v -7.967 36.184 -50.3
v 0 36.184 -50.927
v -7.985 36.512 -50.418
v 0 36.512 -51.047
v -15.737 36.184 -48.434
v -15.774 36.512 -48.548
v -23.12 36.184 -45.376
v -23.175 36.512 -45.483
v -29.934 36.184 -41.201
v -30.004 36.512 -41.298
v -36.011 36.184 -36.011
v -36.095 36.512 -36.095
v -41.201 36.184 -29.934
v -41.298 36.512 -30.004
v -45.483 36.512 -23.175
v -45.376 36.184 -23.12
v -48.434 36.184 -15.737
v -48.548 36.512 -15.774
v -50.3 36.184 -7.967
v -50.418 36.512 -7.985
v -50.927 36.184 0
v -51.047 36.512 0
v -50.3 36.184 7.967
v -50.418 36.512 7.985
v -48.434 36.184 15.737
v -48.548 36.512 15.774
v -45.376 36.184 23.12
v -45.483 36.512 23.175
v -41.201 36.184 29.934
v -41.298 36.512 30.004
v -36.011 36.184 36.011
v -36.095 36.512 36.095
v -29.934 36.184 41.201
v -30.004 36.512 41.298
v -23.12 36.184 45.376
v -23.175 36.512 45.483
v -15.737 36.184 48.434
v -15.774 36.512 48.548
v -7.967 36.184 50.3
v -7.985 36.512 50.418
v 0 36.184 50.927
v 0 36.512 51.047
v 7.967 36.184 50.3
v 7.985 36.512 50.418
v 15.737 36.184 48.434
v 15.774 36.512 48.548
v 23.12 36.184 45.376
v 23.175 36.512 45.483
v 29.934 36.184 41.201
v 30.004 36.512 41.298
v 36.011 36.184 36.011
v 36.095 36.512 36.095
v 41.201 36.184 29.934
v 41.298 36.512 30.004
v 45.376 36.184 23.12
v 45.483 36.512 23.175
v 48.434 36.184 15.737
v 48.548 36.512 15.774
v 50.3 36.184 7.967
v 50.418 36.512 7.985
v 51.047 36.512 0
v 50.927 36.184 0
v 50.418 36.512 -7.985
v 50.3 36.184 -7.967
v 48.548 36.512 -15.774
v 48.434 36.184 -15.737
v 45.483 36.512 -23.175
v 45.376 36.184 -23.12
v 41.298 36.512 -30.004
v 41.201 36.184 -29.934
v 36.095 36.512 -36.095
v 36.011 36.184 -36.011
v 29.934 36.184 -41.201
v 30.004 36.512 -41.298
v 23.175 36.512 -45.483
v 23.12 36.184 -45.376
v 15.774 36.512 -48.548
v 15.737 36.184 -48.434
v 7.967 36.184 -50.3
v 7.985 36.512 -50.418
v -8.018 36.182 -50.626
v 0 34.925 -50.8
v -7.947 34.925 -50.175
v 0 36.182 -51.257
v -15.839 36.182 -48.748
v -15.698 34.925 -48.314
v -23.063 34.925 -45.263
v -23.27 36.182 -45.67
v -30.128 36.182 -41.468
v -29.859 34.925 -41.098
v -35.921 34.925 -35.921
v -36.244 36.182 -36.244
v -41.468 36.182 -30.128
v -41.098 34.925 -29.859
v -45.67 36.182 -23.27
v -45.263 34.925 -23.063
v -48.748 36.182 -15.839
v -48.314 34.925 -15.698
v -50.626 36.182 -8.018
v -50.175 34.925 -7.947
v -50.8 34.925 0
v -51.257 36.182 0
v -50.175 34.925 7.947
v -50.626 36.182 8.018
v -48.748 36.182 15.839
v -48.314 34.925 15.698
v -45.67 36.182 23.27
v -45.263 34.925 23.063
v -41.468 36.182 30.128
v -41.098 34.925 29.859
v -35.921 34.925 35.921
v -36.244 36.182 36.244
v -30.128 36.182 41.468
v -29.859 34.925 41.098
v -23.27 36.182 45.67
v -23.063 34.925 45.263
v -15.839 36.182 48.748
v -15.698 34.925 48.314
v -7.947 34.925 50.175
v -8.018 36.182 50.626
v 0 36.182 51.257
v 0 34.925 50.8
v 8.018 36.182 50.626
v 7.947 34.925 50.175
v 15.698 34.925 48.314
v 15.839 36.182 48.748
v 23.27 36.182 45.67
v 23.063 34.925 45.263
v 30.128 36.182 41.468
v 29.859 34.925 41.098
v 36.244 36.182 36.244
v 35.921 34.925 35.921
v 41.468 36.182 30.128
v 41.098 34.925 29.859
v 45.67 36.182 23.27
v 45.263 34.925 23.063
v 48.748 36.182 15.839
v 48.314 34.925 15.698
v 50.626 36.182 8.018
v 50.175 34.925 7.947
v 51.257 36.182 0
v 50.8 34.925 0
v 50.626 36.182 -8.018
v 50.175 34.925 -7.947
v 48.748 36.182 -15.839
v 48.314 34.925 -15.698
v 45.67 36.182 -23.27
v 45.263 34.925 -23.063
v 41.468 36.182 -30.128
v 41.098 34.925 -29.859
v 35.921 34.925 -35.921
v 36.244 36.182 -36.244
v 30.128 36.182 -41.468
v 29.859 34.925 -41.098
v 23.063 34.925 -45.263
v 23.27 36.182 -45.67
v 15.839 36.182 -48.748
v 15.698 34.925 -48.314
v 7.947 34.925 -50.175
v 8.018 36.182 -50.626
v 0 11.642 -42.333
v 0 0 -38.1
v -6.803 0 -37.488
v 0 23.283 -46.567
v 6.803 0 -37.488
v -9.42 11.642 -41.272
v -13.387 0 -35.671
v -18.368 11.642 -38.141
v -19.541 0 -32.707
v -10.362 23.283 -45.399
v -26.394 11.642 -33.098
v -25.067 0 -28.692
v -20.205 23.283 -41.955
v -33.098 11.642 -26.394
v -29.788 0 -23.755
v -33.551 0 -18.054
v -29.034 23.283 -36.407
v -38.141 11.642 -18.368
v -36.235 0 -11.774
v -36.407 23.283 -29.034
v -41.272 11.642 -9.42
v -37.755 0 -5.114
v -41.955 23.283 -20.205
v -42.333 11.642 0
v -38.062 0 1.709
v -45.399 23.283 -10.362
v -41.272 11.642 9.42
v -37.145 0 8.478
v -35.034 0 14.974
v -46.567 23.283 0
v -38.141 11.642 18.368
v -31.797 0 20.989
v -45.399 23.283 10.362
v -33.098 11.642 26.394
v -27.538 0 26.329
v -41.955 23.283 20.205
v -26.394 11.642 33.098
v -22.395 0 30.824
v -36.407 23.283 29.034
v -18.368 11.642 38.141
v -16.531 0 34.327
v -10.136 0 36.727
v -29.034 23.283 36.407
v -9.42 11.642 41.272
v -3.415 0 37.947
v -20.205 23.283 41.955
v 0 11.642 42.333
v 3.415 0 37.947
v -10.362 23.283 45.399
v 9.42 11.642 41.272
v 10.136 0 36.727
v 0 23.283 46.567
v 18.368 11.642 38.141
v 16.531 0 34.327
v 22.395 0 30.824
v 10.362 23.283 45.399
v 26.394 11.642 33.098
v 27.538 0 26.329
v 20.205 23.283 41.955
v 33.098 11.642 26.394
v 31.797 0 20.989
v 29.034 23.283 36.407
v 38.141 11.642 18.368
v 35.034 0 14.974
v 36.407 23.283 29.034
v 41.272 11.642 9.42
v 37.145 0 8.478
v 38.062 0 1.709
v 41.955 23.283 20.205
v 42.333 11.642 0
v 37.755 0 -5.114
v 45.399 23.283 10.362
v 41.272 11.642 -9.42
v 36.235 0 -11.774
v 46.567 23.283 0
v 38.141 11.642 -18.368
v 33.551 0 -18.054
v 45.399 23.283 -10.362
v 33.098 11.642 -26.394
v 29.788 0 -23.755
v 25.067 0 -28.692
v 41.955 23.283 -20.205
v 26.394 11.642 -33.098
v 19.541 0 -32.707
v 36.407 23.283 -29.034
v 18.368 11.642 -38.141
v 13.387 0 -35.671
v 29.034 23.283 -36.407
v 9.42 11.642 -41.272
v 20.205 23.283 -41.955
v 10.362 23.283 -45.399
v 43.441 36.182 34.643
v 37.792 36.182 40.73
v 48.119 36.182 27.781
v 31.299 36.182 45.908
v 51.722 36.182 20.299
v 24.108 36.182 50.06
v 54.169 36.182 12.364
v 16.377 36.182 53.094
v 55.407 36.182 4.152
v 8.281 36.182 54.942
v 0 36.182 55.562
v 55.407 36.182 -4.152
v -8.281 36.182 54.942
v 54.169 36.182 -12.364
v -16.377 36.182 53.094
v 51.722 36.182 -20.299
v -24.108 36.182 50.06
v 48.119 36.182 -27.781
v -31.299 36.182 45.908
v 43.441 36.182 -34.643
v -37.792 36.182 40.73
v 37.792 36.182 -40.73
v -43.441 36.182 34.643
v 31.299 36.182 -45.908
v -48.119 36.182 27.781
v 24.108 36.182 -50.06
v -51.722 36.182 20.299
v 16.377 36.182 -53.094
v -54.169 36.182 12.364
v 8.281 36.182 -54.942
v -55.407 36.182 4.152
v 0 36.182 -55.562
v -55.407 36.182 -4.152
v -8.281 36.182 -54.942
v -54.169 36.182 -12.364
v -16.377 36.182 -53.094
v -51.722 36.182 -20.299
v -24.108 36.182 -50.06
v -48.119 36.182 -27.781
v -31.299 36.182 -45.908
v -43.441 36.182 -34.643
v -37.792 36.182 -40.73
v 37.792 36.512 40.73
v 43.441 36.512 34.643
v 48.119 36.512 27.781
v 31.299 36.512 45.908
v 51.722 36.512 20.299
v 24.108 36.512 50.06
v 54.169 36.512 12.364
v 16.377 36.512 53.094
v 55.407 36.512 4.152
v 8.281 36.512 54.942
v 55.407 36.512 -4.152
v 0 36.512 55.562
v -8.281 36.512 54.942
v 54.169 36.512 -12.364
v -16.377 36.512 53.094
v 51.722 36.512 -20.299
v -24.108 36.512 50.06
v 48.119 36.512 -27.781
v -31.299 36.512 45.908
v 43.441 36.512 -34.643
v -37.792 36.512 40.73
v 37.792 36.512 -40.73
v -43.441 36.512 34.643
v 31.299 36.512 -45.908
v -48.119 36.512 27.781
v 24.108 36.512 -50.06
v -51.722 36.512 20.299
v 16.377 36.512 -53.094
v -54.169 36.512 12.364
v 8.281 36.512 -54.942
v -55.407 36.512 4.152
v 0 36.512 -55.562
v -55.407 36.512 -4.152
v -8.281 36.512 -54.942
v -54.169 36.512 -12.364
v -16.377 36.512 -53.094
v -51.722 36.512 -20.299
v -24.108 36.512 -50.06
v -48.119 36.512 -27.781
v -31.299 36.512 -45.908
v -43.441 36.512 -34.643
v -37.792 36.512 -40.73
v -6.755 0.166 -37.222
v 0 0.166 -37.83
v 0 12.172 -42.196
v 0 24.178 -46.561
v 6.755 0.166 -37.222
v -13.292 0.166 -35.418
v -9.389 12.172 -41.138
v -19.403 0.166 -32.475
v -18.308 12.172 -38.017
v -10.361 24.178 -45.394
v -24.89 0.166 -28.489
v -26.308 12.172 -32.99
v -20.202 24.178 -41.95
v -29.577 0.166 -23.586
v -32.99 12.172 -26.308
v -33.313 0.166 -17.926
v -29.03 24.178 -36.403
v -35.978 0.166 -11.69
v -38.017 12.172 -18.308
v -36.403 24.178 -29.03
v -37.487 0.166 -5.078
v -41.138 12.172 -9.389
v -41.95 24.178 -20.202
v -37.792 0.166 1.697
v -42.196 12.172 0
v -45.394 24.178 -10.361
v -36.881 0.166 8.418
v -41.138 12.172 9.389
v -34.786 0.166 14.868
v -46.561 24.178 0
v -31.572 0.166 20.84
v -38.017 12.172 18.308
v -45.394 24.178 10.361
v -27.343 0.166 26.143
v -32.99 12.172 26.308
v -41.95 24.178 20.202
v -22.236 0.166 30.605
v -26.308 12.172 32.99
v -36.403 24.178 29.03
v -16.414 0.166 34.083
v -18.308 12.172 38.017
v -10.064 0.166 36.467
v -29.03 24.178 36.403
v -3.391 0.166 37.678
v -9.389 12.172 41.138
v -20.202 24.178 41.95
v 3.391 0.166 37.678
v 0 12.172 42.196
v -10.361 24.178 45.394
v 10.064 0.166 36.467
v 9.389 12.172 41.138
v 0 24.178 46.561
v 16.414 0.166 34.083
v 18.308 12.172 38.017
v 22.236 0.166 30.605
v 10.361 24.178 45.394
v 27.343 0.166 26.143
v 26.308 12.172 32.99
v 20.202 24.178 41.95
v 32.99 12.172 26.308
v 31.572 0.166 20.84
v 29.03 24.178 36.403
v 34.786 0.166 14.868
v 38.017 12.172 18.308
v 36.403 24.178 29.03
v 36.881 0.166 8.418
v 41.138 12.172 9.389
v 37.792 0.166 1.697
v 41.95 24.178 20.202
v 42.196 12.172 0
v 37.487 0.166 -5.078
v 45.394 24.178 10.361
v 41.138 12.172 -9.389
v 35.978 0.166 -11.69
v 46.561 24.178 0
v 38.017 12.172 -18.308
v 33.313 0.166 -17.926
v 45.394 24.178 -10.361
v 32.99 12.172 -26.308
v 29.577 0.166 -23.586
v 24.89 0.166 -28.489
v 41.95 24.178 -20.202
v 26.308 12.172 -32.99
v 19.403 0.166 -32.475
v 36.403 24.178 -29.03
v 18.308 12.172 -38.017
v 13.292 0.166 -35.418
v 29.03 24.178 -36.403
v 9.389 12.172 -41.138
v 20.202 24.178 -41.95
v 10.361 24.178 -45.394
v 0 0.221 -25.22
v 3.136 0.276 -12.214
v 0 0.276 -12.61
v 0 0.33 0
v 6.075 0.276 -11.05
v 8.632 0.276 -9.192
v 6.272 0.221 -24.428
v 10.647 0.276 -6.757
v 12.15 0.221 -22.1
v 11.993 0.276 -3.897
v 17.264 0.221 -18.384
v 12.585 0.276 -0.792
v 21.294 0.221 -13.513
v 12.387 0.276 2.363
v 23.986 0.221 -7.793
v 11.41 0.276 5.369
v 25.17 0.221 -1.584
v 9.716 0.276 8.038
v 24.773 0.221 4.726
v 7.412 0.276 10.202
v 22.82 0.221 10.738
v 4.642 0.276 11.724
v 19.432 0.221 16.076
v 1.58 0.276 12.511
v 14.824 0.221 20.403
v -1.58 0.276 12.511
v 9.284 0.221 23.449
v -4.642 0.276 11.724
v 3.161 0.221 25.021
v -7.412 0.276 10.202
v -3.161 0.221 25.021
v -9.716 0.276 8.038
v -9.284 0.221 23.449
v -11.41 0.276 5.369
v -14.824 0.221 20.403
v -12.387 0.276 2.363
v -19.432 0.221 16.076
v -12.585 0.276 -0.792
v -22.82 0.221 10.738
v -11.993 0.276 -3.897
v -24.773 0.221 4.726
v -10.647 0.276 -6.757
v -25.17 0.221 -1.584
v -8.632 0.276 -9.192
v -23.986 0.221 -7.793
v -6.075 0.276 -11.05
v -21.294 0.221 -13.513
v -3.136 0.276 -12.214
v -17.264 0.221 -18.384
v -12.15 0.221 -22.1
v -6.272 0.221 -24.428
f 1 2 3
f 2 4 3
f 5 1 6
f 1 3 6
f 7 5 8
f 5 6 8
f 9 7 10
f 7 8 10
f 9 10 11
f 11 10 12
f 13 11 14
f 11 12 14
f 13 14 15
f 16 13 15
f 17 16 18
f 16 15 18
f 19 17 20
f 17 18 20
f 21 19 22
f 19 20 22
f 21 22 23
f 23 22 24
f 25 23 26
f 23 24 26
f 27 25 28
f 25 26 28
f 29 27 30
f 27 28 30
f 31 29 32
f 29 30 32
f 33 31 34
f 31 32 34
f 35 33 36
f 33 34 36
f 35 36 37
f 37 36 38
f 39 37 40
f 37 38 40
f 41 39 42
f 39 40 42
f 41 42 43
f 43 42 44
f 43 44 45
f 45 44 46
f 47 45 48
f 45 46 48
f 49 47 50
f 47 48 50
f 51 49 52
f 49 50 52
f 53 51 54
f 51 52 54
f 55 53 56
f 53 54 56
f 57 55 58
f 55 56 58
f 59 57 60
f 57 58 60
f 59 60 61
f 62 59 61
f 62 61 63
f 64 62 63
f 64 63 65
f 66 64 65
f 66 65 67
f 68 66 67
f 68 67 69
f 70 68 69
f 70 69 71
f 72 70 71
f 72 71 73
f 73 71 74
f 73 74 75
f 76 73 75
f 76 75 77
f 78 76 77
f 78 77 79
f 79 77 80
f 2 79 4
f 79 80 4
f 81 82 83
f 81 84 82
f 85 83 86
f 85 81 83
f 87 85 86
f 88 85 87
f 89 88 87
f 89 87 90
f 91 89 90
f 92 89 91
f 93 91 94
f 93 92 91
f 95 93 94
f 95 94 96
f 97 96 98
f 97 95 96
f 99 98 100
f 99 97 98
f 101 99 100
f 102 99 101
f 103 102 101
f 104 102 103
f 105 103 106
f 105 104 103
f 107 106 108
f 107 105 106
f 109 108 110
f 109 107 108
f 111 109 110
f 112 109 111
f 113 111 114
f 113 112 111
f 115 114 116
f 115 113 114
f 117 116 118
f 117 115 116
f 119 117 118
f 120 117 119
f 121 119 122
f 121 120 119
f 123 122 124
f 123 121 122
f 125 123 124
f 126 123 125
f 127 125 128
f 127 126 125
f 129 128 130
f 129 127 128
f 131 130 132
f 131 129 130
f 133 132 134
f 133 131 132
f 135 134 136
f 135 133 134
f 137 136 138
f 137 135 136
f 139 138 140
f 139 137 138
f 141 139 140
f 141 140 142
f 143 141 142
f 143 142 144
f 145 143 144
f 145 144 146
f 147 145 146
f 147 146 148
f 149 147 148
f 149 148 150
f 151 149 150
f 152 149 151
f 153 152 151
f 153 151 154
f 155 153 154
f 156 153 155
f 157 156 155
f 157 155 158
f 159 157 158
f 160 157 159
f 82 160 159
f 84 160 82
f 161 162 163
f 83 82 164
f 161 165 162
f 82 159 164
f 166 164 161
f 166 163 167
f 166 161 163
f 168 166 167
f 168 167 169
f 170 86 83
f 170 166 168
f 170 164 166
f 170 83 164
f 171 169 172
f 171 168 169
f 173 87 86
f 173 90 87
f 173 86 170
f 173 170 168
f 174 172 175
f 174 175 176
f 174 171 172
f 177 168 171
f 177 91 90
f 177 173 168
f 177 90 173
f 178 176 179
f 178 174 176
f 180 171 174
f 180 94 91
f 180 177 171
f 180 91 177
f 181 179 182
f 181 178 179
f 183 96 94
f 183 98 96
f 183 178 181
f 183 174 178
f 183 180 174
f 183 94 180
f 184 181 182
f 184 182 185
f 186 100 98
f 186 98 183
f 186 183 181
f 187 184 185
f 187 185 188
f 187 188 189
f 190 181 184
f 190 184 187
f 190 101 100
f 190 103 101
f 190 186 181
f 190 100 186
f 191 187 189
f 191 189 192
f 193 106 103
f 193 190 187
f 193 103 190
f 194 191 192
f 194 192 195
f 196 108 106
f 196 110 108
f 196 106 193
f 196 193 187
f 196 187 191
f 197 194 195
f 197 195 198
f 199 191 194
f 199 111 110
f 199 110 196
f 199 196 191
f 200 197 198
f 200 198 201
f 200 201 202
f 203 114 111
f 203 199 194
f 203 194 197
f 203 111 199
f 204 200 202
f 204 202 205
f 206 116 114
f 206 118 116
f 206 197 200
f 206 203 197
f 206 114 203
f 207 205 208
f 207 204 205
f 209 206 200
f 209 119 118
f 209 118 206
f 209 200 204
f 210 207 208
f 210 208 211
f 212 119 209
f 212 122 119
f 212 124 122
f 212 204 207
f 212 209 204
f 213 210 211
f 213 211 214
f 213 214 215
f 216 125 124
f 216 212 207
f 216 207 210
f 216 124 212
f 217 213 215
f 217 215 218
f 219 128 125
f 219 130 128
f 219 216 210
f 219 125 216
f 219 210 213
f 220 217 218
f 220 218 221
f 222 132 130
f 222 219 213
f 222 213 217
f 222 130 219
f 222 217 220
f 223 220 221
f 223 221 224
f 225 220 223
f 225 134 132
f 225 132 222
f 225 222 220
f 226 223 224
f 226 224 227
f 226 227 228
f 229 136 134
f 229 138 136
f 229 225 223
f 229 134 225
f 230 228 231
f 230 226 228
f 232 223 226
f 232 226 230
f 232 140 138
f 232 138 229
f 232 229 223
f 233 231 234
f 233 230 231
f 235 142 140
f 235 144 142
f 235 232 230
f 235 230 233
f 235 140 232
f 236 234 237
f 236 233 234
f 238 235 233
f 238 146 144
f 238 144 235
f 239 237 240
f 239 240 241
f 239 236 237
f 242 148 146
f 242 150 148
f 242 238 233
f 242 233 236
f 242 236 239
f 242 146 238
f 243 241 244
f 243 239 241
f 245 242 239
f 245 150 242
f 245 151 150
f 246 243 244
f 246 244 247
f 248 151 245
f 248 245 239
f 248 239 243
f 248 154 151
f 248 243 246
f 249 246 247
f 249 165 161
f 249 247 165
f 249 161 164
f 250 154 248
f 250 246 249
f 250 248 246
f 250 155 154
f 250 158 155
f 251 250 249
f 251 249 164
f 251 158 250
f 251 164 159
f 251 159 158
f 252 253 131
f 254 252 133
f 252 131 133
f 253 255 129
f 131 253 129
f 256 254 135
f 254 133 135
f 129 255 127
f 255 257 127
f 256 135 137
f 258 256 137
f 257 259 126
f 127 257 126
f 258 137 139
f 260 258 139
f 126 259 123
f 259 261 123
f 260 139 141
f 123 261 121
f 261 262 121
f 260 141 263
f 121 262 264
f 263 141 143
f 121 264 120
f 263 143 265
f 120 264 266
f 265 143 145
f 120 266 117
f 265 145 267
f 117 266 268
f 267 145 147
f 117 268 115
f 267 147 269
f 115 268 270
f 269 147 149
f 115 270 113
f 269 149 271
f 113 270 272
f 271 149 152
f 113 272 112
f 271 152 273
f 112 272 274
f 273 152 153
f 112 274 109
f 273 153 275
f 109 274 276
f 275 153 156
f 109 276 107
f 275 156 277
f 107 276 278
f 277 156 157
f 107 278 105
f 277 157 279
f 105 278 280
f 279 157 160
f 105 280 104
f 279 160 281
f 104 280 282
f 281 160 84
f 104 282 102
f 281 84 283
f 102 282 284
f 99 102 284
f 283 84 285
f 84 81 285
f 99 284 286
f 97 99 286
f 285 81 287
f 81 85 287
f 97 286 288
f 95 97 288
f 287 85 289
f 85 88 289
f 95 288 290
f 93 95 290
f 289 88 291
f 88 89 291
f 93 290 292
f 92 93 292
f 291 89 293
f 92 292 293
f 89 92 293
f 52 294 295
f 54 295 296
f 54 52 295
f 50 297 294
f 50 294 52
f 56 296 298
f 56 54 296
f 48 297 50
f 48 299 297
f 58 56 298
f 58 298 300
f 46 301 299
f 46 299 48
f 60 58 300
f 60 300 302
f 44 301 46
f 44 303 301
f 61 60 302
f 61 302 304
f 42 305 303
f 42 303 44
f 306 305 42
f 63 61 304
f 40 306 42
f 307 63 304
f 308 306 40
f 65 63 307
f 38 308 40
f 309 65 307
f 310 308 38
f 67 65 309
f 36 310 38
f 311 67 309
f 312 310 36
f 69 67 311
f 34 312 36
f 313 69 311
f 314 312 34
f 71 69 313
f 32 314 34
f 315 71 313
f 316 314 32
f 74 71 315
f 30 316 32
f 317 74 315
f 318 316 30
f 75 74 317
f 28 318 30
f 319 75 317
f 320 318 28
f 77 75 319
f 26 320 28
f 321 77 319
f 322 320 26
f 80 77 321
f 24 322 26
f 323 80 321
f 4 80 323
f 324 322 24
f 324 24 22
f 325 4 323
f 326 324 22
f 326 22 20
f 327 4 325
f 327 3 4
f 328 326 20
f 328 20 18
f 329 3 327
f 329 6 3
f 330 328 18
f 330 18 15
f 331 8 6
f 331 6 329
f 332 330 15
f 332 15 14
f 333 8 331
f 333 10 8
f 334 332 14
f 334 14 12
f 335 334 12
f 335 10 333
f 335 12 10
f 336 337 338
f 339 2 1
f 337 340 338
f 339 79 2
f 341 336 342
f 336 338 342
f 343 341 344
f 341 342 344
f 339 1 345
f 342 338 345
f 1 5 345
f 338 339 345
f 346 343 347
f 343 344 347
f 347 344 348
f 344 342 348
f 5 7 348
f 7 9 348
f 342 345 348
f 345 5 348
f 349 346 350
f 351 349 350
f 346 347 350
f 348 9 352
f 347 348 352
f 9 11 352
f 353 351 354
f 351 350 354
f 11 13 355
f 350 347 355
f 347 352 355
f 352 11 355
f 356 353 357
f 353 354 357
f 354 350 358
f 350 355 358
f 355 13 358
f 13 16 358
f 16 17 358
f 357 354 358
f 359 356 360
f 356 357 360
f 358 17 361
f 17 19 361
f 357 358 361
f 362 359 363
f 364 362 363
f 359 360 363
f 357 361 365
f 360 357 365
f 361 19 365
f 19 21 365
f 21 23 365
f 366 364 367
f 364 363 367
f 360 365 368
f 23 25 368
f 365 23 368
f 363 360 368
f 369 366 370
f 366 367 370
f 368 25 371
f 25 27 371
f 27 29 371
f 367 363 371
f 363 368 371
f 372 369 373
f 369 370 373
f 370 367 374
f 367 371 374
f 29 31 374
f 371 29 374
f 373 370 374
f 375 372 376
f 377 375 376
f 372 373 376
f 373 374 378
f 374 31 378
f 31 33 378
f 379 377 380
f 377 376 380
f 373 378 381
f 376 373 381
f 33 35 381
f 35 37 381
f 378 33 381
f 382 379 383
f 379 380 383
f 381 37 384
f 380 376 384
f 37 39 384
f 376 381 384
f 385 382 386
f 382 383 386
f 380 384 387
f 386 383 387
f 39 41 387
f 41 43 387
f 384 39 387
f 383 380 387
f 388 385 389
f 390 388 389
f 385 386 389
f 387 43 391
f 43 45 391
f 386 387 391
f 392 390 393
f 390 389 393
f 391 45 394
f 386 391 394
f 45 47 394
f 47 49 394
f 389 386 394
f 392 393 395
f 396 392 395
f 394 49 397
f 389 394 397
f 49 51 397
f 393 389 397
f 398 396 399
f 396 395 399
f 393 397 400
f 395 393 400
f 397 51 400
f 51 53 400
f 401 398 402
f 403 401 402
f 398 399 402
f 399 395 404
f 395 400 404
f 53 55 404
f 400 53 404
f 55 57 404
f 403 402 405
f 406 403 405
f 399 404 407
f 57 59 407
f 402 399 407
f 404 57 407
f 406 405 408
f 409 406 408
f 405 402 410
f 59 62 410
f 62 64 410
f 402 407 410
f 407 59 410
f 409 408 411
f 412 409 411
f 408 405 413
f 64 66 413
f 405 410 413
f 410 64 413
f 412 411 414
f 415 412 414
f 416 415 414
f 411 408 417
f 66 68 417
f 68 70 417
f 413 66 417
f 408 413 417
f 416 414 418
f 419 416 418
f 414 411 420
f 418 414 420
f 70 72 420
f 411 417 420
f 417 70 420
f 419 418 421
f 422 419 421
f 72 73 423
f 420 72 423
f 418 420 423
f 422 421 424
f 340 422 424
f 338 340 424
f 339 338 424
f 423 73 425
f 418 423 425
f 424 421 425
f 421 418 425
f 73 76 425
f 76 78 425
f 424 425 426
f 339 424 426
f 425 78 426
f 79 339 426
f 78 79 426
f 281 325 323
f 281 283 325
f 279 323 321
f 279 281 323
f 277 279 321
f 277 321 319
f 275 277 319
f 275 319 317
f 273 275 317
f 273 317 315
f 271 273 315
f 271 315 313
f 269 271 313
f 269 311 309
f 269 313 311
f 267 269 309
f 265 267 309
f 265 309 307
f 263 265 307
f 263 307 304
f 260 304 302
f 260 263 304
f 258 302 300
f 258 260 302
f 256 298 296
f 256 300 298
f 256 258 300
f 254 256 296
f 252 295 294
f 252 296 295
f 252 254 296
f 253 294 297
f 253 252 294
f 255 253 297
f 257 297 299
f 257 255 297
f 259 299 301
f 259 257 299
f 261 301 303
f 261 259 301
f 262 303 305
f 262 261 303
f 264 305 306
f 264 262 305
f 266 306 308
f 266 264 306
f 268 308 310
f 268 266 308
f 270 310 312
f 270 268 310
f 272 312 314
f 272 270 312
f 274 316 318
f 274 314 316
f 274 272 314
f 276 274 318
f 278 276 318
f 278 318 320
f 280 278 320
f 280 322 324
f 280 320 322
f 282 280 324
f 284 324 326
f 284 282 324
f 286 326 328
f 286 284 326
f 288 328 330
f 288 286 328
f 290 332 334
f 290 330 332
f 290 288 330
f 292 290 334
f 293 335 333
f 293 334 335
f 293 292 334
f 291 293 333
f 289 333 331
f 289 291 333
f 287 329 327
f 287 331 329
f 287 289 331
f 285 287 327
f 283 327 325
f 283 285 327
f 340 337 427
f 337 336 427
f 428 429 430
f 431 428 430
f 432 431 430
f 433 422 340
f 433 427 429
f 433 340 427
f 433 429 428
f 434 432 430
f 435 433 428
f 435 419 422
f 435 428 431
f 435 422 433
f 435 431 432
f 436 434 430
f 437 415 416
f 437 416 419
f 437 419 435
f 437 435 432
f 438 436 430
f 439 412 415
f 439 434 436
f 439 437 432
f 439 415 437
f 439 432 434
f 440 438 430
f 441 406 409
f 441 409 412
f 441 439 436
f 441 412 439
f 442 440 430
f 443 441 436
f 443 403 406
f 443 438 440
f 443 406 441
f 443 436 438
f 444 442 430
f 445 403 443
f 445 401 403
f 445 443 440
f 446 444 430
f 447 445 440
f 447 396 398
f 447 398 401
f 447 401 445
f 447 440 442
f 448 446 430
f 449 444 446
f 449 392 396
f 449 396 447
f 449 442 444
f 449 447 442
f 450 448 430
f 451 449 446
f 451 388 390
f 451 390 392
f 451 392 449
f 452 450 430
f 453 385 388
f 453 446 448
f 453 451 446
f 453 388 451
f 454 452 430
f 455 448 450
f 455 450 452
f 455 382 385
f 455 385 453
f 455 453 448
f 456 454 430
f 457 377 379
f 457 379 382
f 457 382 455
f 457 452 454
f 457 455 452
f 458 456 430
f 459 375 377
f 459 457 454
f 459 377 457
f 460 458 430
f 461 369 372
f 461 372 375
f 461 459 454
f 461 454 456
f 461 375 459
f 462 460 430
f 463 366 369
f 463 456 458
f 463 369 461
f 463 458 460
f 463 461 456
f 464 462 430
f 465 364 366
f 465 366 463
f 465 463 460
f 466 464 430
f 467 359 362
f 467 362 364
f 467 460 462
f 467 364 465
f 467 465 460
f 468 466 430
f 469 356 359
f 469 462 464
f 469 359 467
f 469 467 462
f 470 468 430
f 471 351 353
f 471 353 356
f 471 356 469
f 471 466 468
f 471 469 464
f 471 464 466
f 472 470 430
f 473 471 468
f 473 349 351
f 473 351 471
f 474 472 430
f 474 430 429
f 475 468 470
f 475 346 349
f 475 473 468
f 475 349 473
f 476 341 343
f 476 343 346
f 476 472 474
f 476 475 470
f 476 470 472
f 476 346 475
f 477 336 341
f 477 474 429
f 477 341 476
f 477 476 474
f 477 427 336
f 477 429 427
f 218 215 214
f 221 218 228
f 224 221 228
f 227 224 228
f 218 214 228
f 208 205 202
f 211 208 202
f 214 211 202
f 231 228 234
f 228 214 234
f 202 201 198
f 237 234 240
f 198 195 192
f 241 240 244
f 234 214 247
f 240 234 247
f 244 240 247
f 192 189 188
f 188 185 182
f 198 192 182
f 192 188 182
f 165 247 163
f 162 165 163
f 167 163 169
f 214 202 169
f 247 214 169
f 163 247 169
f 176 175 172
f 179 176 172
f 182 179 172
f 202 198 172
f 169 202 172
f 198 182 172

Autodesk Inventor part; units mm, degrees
ref_plane "YZ Plane" through (0, 0, 0) normal (1, 0, 0) x (0, 1, 0)
ref_plane "XZ Plane" through (0, 0, 0) normal (0, 1, 0) x (-1, 0, 0)
ref_plane "XY Plane" through (0, 0, 0) normal (0, 0, 1) x (1, 0, 0)
sketch "Sketch1" plane through (0, 0, 0) normal (1, 0, 0) x (0, 1, 0)
  line L0 (0, 0) -> (0, -38.1)
  line L1 (0, 0) -> (36.5125, 0)
  line L2 (36.5125, -51.0466) -> (36.5125, -57.15)
  line L3 (36.5125, -57.15) -> (35.1989, -57.15)
  line L4 (34.925, -50.8) -> (0, -38.1)
  line L5 (36.5125, -55.5625) -> (36.5125, -57.15)
  line L6 (36.5125, -55.5625) -> (36.1823, -55.5625)
  line L7 (36.1823, -55.5625) -> (36.1823, -51.2572)
  line L8 (36.1823, -55.5625) -> (40.5858, -55.5625) construction
  line L9 (34.925, -50.8) -> (36.1823, -51.2572)
  arc A0 (36.516, -55.6063) -> (36.5125, -55.5625) centre (35.0619, -55.6994) ccw
  line L10 (35.1989, -57.15) -> (36.1823, -55.5625)
  line L11 (0, 0) -> (0.3302, 0)
  line L12 (0.3302, 0) -> (0.1665, -37.8298)
  line L13 (36.1837, -50.927) -> (0.1665, -37.8298)
  line L14 (36.1837, -50.927) -> (36.5125, -51.0466)
  dimension "d0" = 38.1
  dimension "d1" = 36.5125
  dimension "d2" = 57.15
  dimension "d5" = 0.3302
  dimension "d6" = 90
  dimension "d7" = 0.3302
revolve "Revolution1" add sketch "Sketch1" angle 360 about axis through (0, 0, 0) along (0, 1, 0) contours L1 L12 L13 L14 L2 L6 L7 L9 L4 L0
properties part number "bowl-2" material "Stainless Steel"
